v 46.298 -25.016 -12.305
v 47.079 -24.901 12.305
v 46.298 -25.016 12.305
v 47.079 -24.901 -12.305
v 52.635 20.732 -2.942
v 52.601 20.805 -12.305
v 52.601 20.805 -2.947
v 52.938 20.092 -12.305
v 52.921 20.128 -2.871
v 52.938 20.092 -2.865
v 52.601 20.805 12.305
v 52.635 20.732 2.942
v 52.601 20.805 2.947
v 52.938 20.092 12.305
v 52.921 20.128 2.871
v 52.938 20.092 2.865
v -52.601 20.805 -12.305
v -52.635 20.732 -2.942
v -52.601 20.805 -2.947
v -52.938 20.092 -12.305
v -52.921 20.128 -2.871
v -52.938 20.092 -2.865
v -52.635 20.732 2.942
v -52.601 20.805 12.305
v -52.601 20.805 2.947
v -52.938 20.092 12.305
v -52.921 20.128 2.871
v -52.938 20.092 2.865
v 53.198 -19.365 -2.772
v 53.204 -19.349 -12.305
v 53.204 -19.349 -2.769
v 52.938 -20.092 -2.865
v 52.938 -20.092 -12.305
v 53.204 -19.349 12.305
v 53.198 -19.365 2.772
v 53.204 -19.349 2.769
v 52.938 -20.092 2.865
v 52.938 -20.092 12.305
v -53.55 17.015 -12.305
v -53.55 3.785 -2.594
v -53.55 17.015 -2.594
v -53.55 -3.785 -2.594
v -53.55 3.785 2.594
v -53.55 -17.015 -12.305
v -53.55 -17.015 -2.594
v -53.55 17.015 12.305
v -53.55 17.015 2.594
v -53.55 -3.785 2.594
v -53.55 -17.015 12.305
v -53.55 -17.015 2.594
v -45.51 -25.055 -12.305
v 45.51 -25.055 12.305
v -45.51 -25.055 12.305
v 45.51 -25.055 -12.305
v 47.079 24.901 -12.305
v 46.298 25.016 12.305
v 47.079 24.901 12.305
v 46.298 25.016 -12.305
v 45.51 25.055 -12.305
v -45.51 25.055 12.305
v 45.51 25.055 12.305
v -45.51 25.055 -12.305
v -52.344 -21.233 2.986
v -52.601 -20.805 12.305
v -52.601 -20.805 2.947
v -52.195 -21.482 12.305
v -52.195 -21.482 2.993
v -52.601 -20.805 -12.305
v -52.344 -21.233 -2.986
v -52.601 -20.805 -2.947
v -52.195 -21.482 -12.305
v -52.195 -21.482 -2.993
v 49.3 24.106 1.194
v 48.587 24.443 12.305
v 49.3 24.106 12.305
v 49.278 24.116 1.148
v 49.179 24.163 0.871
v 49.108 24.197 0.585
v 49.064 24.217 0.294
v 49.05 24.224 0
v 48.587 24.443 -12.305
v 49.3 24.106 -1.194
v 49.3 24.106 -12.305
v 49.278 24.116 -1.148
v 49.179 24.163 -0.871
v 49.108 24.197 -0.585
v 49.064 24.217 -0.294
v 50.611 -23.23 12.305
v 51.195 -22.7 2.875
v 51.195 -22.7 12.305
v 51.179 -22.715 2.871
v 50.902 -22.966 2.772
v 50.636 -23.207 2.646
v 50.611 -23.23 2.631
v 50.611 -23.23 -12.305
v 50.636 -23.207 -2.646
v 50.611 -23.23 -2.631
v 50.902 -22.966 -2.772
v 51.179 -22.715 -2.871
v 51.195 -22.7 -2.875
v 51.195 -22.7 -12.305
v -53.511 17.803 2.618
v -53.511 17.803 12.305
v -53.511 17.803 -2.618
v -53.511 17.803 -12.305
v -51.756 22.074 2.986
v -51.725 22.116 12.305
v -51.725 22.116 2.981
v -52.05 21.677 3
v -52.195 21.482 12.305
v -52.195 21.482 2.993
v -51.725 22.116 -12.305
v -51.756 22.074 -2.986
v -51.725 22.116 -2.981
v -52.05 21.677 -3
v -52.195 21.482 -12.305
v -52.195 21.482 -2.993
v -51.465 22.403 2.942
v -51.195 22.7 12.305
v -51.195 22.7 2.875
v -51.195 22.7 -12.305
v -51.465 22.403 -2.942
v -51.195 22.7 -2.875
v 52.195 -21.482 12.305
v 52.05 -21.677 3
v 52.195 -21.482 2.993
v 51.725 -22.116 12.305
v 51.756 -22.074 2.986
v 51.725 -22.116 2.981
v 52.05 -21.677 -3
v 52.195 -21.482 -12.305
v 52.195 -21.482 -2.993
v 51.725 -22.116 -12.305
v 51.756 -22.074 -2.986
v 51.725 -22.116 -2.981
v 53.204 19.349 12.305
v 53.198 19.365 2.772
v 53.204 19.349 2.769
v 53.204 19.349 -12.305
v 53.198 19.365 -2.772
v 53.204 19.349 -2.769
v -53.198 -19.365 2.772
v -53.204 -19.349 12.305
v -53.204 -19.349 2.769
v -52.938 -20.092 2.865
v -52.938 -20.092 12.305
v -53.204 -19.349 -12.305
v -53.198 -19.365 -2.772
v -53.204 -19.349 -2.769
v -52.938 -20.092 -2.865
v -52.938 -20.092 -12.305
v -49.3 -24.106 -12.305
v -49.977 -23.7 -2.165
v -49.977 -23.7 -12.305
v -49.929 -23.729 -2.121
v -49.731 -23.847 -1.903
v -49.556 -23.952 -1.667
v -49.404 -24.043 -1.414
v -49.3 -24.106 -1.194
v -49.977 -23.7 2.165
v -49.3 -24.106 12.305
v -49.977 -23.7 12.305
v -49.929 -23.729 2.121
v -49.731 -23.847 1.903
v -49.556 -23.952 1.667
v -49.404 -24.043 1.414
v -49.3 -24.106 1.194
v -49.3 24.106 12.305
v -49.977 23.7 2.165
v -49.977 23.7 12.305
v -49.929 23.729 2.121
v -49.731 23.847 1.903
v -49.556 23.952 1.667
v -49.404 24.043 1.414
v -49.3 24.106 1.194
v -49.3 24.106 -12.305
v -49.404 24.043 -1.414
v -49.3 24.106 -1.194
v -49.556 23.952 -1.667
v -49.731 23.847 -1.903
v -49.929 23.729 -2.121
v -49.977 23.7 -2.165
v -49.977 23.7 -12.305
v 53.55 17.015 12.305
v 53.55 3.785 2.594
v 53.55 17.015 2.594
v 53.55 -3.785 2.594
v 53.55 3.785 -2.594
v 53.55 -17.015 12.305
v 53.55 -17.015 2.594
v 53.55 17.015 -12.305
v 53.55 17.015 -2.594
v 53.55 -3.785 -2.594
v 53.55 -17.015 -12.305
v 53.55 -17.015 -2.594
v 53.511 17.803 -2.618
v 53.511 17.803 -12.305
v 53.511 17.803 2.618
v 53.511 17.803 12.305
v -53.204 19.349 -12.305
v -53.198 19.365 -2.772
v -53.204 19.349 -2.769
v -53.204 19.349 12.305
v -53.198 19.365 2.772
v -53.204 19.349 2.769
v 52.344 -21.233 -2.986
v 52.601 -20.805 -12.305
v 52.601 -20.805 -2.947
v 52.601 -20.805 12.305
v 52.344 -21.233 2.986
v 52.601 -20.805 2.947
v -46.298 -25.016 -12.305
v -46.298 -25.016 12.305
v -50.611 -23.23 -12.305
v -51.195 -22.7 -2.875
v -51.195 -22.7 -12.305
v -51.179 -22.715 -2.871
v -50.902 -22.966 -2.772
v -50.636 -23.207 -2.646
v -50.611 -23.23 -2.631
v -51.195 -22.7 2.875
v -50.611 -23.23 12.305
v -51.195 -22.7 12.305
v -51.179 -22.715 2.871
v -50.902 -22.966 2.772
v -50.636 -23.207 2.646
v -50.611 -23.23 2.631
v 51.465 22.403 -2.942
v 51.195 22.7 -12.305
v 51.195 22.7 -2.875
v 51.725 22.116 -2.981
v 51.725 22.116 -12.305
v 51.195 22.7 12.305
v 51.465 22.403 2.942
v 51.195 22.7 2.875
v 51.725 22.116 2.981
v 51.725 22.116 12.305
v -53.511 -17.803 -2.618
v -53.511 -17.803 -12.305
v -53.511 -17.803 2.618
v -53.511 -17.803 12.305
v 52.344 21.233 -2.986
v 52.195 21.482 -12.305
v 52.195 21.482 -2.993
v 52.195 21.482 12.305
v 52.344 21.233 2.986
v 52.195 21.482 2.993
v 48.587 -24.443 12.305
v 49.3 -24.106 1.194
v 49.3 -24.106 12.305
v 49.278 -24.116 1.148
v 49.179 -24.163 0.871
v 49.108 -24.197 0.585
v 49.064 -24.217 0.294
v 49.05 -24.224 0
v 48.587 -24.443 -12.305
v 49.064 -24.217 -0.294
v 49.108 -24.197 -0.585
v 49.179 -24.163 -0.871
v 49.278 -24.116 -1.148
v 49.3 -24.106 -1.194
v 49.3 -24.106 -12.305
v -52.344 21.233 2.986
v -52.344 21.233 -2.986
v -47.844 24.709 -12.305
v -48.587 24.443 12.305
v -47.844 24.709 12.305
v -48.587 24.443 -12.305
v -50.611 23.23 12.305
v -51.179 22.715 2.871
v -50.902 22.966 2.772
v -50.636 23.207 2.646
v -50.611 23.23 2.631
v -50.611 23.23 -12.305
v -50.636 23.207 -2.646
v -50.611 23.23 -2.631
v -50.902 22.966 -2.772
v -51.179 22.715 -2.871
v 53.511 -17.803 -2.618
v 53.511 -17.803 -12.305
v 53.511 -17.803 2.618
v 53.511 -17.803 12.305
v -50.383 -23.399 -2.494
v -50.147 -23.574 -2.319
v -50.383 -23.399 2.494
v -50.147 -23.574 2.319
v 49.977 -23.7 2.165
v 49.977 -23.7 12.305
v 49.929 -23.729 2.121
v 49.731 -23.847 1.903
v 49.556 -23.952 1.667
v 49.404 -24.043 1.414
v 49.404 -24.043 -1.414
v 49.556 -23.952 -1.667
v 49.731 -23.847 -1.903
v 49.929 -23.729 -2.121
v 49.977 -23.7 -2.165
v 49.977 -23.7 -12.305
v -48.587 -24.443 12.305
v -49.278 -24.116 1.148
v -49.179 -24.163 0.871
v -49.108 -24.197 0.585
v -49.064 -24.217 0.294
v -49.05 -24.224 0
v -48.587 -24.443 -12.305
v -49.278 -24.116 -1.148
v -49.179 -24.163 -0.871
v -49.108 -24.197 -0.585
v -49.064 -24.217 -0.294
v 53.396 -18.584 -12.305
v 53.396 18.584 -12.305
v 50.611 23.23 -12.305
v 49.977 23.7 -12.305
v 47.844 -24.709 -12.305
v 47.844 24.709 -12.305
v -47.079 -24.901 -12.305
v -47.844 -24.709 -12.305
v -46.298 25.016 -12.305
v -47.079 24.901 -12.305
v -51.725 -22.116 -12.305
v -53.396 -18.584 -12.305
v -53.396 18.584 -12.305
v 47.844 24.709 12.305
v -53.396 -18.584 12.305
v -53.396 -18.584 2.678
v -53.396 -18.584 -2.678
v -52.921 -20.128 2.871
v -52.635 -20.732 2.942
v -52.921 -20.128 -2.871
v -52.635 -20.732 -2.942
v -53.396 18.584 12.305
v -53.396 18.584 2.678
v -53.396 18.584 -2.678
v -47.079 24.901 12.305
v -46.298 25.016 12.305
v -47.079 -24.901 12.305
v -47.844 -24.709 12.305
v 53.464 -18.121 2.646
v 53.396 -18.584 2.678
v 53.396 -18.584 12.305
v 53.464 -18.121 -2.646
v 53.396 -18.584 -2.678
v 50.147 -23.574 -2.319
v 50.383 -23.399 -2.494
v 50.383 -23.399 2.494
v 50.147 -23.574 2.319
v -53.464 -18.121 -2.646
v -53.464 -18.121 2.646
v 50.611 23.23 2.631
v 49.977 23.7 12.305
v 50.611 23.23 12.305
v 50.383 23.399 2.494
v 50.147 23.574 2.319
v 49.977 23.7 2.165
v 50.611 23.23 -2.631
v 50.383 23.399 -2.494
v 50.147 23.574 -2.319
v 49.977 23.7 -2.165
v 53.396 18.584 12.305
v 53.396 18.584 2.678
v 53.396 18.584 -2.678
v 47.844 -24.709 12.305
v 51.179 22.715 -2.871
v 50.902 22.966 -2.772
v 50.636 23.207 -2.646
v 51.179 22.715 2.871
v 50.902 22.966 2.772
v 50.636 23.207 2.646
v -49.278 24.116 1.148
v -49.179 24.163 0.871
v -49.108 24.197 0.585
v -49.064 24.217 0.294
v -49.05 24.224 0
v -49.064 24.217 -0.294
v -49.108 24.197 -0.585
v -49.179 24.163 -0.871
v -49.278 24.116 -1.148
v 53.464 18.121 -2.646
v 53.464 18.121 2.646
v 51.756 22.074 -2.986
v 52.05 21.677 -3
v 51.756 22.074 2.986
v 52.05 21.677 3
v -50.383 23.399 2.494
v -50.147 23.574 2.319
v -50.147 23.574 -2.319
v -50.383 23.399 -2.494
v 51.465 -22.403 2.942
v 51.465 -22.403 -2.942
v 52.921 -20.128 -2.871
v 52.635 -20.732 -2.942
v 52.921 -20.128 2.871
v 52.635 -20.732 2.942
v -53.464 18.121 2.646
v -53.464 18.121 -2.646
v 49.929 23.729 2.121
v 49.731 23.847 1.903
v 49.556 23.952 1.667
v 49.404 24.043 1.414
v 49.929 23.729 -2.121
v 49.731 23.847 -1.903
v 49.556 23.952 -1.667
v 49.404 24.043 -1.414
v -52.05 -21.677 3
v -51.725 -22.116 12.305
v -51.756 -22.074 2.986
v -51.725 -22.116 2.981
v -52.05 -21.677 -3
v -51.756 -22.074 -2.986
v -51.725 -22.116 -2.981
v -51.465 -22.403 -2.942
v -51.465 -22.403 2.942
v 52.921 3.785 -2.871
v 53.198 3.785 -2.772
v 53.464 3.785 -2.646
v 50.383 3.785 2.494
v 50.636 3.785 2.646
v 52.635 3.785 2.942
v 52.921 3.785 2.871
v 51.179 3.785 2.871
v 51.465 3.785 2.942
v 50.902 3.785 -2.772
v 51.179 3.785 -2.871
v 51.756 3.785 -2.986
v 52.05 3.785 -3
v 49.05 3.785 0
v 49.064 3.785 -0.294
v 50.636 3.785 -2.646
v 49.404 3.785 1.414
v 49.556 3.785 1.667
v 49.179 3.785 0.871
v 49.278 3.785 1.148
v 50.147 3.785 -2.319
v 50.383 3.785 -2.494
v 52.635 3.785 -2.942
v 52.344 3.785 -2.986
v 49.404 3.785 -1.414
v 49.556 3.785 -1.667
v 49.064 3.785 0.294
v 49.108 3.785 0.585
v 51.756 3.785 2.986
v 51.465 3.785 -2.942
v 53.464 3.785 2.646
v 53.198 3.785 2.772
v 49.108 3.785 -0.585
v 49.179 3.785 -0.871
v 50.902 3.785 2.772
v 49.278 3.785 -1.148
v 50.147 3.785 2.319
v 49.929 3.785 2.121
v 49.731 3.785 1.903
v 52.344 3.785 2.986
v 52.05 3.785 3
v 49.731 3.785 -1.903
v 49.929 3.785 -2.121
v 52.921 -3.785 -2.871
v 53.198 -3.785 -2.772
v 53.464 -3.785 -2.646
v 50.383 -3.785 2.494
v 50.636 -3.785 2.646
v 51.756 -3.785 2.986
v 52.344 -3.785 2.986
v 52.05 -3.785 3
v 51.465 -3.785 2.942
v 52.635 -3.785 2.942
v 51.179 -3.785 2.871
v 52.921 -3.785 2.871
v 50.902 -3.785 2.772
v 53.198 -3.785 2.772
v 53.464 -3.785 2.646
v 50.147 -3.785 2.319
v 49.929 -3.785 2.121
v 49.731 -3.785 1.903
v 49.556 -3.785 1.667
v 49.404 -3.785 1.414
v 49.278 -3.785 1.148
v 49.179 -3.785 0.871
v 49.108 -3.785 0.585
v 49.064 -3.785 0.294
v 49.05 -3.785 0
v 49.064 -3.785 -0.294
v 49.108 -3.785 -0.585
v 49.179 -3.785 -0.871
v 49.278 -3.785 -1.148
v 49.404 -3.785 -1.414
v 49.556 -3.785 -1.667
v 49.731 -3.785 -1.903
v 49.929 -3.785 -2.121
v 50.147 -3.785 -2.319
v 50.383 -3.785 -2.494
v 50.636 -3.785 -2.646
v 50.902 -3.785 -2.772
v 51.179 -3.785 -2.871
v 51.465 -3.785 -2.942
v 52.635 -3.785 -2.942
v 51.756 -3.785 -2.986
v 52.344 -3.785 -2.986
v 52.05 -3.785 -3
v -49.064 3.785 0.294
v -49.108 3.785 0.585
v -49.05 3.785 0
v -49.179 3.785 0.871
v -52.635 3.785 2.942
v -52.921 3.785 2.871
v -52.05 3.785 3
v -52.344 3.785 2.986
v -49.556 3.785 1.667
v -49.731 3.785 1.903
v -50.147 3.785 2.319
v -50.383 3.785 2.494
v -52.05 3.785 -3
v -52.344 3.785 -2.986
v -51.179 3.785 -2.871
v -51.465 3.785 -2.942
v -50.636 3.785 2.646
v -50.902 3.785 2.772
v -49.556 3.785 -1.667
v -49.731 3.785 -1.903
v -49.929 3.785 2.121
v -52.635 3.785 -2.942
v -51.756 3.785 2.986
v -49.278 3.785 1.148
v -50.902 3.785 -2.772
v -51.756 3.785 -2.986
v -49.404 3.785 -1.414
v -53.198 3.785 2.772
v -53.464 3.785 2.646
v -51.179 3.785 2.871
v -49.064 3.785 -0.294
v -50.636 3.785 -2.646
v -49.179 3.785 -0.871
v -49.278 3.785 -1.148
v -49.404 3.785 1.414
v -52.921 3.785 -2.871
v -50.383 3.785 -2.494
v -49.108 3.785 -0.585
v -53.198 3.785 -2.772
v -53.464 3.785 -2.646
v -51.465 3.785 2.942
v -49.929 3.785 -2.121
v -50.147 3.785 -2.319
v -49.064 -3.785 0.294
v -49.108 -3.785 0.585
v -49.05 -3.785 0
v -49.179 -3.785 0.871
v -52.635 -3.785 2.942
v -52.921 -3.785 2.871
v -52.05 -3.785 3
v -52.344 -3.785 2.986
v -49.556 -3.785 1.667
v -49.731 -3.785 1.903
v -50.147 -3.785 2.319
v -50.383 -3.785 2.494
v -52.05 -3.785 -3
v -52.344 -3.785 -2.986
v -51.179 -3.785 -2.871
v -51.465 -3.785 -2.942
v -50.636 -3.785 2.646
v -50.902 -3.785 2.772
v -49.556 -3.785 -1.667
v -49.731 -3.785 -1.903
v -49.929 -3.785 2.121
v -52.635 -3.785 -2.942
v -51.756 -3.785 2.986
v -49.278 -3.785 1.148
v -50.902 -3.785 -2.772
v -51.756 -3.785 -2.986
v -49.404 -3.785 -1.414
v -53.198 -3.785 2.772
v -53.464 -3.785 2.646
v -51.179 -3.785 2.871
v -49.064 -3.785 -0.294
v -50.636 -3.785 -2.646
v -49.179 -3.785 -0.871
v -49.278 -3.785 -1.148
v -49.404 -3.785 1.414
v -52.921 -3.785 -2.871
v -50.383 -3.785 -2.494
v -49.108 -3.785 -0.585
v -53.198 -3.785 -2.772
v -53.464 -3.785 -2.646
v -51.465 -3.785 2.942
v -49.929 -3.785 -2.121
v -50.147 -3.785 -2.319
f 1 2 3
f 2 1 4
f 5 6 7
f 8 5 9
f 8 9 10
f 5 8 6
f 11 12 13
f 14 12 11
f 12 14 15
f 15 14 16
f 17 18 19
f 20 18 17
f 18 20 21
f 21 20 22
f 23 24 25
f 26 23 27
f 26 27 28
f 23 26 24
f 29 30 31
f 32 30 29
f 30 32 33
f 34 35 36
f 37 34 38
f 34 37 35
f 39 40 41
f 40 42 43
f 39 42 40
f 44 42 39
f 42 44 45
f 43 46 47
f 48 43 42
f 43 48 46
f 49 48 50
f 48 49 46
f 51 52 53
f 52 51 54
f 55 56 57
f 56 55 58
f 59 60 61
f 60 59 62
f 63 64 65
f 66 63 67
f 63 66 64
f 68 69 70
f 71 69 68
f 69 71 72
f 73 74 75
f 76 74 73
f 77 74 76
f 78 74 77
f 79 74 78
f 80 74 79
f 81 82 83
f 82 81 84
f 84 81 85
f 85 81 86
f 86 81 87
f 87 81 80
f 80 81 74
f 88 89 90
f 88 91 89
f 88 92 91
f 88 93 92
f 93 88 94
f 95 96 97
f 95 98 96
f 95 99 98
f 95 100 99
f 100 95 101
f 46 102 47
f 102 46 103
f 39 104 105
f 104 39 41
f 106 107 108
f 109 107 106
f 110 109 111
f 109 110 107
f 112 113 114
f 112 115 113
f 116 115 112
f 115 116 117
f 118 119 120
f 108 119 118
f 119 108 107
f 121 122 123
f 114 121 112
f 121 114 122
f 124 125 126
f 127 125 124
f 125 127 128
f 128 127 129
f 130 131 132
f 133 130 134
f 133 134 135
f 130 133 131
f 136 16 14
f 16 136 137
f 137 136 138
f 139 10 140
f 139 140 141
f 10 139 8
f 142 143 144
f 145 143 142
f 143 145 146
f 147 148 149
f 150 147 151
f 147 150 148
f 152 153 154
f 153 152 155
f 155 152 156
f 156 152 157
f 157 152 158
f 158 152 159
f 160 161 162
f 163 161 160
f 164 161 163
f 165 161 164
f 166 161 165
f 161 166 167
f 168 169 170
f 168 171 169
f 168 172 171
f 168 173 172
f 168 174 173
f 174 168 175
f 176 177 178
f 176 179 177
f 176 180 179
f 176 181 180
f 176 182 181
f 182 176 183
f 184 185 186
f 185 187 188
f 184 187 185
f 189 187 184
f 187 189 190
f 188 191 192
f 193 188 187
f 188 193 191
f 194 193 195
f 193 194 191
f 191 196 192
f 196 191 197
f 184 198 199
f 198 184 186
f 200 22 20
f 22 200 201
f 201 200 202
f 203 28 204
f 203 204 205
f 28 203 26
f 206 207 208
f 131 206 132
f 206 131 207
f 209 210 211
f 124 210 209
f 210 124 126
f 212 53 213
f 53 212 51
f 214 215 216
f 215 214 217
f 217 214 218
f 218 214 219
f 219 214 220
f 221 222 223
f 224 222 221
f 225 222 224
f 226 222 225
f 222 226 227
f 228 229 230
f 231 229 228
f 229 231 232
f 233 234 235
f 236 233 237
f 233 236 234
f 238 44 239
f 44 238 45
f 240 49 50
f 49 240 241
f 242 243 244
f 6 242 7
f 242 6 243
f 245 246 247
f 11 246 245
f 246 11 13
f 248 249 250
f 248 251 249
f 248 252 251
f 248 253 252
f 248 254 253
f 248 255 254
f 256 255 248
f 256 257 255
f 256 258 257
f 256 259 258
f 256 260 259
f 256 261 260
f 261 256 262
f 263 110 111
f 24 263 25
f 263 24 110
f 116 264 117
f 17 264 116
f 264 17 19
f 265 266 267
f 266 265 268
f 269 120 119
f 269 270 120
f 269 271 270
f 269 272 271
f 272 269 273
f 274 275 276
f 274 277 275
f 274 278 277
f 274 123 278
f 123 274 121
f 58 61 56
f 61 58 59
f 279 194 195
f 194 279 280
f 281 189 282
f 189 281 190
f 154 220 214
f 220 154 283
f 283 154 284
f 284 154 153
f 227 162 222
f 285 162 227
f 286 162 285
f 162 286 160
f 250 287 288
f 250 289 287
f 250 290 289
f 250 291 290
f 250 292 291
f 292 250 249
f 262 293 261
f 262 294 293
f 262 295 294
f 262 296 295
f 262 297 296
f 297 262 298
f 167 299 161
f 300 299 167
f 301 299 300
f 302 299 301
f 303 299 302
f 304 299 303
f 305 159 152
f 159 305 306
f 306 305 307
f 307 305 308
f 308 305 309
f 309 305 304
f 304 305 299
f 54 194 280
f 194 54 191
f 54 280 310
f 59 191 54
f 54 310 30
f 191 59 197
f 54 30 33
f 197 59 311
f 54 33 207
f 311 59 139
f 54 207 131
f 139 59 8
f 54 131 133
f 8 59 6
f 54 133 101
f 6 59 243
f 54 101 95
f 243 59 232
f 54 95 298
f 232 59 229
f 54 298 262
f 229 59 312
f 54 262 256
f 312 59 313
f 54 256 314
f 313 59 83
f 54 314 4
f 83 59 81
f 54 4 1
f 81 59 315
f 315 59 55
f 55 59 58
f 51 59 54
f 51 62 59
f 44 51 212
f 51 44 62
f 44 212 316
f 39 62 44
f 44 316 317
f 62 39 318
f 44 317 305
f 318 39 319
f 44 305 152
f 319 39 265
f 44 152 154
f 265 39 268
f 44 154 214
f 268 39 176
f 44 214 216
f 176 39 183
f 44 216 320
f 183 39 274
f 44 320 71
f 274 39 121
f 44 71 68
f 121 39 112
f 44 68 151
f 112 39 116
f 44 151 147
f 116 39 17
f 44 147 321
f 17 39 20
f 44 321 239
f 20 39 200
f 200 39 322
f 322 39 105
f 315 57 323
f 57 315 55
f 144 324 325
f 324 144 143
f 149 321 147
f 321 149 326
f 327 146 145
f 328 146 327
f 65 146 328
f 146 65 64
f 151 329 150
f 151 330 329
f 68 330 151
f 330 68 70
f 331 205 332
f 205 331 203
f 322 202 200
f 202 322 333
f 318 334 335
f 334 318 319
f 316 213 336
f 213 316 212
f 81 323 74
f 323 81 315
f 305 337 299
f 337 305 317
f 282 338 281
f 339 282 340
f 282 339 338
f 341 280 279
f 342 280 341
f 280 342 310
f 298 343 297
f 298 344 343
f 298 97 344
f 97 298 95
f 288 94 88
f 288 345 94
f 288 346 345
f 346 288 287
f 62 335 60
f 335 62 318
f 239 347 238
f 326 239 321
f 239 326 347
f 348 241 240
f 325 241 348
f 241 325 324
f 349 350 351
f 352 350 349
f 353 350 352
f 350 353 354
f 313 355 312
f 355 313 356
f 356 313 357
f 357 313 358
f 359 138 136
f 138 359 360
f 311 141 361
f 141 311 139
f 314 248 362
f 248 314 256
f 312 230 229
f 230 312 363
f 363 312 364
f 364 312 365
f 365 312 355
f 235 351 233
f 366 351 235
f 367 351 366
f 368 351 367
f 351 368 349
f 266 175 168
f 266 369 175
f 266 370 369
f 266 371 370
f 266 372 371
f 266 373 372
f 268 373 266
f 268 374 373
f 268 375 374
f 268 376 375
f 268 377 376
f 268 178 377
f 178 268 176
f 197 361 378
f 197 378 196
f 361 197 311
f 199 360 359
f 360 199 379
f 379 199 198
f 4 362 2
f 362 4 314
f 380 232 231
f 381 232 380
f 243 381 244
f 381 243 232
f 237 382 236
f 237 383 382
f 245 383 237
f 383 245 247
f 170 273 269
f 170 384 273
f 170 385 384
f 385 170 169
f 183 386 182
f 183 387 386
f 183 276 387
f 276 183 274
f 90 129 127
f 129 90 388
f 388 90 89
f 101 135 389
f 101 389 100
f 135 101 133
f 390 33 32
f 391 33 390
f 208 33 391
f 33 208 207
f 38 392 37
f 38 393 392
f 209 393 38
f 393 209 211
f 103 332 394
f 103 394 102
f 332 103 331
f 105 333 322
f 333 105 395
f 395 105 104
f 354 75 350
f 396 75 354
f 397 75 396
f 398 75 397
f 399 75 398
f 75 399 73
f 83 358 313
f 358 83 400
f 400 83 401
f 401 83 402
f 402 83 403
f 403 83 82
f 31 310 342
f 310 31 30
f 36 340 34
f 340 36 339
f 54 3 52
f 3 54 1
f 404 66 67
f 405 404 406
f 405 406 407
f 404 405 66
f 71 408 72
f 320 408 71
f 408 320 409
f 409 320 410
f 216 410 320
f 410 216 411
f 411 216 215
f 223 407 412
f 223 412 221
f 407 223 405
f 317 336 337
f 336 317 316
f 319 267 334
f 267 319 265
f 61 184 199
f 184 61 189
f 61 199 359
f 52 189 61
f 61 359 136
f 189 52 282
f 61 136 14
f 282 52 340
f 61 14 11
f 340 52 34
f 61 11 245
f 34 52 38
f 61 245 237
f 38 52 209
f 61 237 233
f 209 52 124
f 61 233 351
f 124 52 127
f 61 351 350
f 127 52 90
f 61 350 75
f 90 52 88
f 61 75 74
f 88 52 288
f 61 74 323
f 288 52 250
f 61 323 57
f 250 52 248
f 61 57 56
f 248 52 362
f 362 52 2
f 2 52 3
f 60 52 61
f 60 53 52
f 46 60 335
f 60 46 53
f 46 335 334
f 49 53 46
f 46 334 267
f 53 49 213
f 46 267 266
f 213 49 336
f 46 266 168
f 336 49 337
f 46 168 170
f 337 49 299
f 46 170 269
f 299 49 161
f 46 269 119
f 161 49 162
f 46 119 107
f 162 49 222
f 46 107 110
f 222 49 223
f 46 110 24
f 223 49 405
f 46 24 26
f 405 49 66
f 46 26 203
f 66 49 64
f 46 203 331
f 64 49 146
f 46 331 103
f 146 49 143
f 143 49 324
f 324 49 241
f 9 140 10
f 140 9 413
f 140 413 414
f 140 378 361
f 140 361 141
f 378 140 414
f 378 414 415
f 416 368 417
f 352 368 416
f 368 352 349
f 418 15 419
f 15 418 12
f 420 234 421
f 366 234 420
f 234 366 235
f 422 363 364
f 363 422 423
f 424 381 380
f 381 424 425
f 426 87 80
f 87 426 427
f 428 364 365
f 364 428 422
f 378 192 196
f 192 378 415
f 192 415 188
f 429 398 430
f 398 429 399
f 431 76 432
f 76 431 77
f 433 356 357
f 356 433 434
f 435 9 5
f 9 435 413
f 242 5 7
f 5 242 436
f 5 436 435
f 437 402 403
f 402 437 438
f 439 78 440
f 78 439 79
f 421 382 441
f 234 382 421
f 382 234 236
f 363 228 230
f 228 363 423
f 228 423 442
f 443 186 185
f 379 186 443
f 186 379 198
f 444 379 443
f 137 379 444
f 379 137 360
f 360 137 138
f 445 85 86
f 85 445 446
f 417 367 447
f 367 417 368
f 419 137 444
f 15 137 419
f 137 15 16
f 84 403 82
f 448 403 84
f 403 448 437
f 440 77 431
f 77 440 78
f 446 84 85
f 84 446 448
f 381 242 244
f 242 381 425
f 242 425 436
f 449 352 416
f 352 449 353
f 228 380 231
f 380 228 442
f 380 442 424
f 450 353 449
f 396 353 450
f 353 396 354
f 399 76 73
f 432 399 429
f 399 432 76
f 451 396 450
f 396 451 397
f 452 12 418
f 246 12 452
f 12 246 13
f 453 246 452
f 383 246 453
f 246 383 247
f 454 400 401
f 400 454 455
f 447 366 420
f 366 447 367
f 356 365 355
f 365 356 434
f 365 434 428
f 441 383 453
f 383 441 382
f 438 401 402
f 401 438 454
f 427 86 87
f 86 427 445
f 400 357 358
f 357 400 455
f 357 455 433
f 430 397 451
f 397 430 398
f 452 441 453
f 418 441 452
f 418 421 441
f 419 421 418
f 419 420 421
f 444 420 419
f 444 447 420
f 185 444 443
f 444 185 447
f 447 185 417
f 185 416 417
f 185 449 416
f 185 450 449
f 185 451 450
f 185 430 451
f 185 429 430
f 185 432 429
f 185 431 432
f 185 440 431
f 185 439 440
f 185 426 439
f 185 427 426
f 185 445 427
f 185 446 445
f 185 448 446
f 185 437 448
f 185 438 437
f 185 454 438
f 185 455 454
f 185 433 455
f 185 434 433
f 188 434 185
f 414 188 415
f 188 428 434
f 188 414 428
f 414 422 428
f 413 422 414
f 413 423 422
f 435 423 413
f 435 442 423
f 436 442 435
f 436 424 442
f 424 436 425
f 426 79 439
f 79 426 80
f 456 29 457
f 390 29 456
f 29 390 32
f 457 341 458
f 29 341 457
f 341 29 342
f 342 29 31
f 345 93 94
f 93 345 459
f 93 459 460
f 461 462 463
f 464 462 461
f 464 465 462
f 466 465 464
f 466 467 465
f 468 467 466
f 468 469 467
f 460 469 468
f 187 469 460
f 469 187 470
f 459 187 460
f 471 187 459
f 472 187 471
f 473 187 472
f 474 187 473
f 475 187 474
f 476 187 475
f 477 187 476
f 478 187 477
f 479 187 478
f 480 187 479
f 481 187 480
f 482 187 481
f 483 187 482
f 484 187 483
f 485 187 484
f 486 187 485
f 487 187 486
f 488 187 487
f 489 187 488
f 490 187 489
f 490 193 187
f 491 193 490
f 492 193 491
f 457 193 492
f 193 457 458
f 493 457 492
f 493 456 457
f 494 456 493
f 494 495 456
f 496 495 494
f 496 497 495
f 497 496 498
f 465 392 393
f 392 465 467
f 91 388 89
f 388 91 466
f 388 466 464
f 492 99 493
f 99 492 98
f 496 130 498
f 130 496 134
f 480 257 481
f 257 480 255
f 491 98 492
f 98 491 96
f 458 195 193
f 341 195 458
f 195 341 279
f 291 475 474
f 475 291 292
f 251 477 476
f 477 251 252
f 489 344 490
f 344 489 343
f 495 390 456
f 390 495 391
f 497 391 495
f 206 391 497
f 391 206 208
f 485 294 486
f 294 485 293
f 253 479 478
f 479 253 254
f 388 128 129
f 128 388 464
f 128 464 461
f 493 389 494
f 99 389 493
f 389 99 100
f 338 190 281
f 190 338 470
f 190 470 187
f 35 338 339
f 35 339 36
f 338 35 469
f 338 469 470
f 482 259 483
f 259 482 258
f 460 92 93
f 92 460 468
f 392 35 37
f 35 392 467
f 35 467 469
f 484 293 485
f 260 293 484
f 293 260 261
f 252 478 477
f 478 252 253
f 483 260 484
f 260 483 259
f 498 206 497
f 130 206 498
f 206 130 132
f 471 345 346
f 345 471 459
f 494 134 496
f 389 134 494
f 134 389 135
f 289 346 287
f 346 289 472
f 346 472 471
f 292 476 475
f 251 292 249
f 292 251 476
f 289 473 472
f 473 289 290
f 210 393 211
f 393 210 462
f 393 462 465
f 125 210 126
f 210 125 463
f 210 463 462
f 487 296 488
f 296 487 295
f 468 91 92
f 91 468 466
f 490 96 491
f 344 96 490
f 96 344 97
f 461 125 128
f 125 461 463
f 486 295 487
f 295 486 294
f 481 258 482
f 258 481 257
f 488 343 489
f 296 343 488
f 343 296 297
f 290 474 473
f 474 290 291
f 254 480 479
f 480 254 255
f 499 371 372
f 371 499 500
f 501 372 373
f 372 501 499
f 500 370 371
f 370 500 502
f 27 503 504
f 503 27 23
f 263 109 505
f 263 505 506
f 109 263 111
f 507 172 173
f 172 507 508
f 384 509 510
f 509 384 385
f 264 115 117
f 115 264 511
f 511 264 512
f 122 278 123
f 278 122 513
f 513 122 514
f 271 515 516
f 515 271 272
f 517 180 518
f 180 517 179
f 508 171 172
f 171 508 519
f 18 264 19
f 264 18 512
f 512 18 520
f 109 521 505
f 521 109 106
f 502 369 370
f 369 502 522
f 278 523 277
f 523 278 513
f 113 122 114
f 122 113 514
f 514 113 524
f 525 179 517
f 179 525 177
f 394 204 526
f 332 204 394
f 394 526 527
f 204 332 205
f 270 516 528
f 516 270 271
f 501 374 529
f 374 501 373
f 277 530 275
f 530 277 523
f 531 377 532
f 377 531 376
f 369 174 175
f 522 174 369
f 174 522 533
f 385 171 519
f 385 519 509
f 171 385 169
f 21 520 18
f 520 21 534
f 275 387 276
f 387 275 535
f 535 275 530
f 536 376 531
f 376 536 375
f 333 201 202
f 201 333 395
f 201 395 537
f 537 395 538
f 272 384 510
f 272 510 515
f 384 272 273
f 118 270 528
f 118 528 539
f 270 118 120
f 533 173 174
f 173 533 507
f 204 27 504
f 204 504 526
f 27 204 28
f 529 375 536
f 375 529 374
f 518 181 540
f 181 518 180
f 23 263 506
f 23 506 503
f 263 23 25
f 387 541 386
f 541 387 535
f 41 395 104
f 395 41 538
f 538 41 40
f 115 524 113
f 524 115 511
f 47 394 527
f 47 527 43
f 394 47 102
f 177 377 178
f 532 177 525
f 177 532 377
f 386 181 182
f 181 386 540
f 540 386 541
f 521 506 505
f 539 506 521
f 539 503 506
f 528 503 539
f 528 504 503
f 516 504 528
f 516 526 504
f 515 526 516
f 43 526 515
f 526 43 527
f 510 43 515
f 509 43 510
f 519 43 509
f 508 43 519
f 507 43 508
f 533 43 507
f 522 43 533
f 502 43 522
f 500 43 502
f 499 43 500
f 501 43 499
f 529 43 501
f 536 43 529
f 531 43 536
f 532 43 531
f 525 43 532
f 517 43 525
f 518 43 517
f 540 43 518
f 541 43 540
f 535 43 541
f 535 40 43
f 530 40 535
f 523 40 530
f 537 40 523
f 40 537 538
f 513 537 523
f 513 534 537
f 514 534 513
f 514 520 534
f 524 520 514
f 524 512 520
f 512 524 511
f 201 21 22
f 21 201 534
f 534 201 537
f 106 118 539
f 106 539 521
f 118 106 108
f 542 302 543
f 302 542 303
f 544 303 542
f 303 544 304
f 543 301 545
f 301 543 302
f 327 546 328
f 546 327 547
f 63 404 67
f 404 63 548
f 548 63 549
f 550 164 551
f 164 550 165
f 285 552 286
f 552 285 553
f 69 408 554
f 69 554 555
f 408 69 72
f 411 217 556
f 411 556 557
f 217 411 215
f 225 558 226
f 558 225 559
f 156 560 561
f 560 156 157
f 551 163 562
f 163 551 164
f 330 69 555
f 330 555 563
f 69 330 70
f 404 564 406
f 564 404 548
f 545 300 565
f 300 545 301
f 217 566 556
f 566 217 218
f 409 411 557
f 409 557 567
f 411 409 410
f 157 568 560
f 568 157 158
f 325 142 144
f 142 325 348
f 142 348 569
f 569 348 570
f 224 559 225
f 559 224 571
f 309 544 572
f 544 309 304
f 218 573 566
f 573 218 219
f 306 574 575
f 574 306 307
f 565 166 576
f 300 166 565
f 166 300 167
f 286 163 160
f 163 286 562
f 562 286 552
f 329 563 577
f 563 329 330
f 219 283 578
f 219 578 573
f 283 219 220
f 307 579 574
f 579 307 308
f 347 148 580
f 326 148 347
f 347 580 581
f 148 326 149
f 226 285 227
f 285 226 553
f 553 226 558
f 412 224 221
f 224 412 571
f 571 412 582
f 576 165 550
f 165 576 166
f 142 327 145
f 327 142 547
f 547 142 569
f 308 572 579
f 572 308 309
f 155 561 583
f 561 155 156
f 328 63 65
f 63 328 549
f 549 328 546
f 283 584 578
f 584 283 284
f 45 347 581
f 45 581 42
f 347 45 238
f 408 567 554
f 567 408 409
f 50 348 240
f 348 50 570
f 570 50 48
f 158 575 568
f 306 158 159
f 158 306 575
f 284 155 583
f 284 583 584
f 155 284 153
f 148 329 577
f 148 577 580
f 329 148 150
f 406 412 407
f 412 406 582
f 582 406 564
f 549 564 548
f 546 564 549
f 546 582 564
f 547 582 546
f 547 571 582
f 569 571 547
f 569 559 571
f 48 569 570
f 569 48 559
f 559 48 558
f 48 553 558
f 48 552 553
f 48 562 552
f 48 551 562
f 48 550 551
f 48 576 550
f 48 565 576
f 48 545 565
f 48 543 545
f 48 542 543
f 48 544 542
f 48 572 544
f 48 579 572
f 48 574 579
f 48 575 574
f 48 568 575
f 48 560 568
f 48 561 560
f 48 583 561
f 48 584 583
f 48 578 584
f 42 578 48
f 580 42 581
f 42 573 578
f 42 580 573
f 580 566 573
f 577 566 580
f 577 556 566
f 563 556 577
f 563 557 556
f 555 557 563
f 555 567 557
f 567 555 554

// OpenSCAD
// ------------------------------------------------------------------
// envelope-dreame-hepa-x50.scad — Dreame X50-family HEPA filter envelope
// BOM L62 "~20 kPa ~110 x 48 x 22mm" row (Dreame X50 Pro/Ultra/Master,
//   L40s/L50, S40, X40 Pro Enhanced, Mova V50 Ultra).
// Source solid: makerspet/oomwoo-one-cad lib/dreame/dreame_hepa_filter.step
//   (upstream commit 61439c3d, 2026-09-27; fetched+measured 2026-09-28,
//   cadquery 2.8 — obj frame PCA/OBB axis-aligned on facet cloud)
//
// PROVENANCE:
//   [M] = measured on that STEP (oriented bbox + face/edge census)
//   [E] = estimate, reasoning on the line
// supersedes the x50 preset numerics in hepa-filter-cartridge/ at the
// variant level (that file stays as the family envelope + jig-a+b basis).
// ----------------------------------------------------------------------

// ----- measured envelope [M] -----
L       = 107.10;  // t1 extent 107.10..107.15 across methods
W       = 24.61;   // t0 24.60/24.63  = pleat-pack thickness axis
H       = 50.11;   // t2 50.11
corner_r = 8.04;   // [M] plan-corner circular edges r8.04 c(±45.77,±16.66) at cap t0 edges — rounded corners
cap_th  = 3.85;    // [M] face t0ext 3.85 @t190 / 3.50 @t190 → end-cap plate ~3.5 mm
sh_th   = 2.88;    // [M] skirt-wall plate 2.88 (231.3..267.1 A faces) [E one panda]
vnoise  = 0.5;     // [M] pleat-face t0 depth noise ±0.5 across 31 t0-bands

// holes [M]: x4 circular edges D6.00 near cap t0 row
// in cap plane: two per cap, pair separations 2.06 (axial) and 36.18 (H)
hole_d      = 6.0;
hole_pair_a = 2.06;    // across pleat W
hole_pair_h = 36.18;   // along H; pair-row center dist H/2+11 => y≈±18 from mid [E back-solved]
hole_inset  = 1.5;     // [E] cap x inset (centers axial +0.26/+1.69 from cloud mean)

// top ridge / tool notch [M]: flank pairs 16.00°/13.03° dip
ridge_press   = true;
ridge_t0      = 1.7;    // [M] ridge faces reach t0 +1.7 (pack t0 -12.1) => 1.7 [E zero-press ref]
ridge_len     = 43.4;   // [M] pk4 t1ext 43.4/43.3
ridge_center_t2 = 0;    // [E] straddles t2 0 (pk4 centers -0.2-2.3)
ridge_dip     = 14.5;   // [E] flank angle mean 13.03/16.00

// skirt leg faces: |n~t1| 0.91..0.94, 55° rotation family [M]; leg width t0≈2.88
skirt_leg_h   = 18.34; // [M] t2 extent 16.24→+/-... flat top faces to t2=+20.07 [E 20.0-1.7]
skirt_leg_t0  = 2.88;

// classic window donors [E]: notch shape between the x50 trap and the x60 sar
window_w = 29.9;  // [E] "M"-window figure derived 2026-09-13 from sister presets; confirm on the physical unit
window_l = 9.19;  // [E] window slot len from notch stand-in
window_zoff = 4.9; // [E] from the trap z-offset lore (_pkg v3)

$fn = 64;

module hepa_x50_measured() {
  difference() {
    union() {
      // main block w/ rounded plan corners (r8.04 in t1/t2? no — plan corner of the LxW face)
      hull() for (sx = [1,-1], sy = [1,-1])
        translate([sx*(L/2-corner_r), sy*(H/2-corner_r), 0])
          cylinder(r = corner_r, h = W, center = true);
      // top ridge press (tool-formed bump straddling t2 mid)
      if (ridge_press)
        translate([ridge_t0, 0, 0])
          rotate([0, 90, 0])
            cylinder(h = 2*ridge_t0, r1 = 6, r2 = 3.5, center = true); // [E visual ridge pos]
    }
    // cap holes x4 (D6, pair sep 2.06 x 36.18)
    for (sx = [1,-1], sy = [1,-1])
      translate([sx*(L/2-hole_inset), sy*hole_pair_h/2, 0])
        rotate([90, 0, 0]) /* along W? holes pierce the CAP not the walls */
          cylinder(h = W + 4, d = hole_d, center = true);
  }
}

hepa_x50_measured();

echo(str("ENVELOPE LxWxH: ", L, " x ", W, " x ", H,
         "  (BOM row 110x48x22; H 50.11 vs BOM 48 = +2.11, W 24.61 vs 22 = +2.61 -> flags in MEASURE-ME section 28 rows 3-4)"));
